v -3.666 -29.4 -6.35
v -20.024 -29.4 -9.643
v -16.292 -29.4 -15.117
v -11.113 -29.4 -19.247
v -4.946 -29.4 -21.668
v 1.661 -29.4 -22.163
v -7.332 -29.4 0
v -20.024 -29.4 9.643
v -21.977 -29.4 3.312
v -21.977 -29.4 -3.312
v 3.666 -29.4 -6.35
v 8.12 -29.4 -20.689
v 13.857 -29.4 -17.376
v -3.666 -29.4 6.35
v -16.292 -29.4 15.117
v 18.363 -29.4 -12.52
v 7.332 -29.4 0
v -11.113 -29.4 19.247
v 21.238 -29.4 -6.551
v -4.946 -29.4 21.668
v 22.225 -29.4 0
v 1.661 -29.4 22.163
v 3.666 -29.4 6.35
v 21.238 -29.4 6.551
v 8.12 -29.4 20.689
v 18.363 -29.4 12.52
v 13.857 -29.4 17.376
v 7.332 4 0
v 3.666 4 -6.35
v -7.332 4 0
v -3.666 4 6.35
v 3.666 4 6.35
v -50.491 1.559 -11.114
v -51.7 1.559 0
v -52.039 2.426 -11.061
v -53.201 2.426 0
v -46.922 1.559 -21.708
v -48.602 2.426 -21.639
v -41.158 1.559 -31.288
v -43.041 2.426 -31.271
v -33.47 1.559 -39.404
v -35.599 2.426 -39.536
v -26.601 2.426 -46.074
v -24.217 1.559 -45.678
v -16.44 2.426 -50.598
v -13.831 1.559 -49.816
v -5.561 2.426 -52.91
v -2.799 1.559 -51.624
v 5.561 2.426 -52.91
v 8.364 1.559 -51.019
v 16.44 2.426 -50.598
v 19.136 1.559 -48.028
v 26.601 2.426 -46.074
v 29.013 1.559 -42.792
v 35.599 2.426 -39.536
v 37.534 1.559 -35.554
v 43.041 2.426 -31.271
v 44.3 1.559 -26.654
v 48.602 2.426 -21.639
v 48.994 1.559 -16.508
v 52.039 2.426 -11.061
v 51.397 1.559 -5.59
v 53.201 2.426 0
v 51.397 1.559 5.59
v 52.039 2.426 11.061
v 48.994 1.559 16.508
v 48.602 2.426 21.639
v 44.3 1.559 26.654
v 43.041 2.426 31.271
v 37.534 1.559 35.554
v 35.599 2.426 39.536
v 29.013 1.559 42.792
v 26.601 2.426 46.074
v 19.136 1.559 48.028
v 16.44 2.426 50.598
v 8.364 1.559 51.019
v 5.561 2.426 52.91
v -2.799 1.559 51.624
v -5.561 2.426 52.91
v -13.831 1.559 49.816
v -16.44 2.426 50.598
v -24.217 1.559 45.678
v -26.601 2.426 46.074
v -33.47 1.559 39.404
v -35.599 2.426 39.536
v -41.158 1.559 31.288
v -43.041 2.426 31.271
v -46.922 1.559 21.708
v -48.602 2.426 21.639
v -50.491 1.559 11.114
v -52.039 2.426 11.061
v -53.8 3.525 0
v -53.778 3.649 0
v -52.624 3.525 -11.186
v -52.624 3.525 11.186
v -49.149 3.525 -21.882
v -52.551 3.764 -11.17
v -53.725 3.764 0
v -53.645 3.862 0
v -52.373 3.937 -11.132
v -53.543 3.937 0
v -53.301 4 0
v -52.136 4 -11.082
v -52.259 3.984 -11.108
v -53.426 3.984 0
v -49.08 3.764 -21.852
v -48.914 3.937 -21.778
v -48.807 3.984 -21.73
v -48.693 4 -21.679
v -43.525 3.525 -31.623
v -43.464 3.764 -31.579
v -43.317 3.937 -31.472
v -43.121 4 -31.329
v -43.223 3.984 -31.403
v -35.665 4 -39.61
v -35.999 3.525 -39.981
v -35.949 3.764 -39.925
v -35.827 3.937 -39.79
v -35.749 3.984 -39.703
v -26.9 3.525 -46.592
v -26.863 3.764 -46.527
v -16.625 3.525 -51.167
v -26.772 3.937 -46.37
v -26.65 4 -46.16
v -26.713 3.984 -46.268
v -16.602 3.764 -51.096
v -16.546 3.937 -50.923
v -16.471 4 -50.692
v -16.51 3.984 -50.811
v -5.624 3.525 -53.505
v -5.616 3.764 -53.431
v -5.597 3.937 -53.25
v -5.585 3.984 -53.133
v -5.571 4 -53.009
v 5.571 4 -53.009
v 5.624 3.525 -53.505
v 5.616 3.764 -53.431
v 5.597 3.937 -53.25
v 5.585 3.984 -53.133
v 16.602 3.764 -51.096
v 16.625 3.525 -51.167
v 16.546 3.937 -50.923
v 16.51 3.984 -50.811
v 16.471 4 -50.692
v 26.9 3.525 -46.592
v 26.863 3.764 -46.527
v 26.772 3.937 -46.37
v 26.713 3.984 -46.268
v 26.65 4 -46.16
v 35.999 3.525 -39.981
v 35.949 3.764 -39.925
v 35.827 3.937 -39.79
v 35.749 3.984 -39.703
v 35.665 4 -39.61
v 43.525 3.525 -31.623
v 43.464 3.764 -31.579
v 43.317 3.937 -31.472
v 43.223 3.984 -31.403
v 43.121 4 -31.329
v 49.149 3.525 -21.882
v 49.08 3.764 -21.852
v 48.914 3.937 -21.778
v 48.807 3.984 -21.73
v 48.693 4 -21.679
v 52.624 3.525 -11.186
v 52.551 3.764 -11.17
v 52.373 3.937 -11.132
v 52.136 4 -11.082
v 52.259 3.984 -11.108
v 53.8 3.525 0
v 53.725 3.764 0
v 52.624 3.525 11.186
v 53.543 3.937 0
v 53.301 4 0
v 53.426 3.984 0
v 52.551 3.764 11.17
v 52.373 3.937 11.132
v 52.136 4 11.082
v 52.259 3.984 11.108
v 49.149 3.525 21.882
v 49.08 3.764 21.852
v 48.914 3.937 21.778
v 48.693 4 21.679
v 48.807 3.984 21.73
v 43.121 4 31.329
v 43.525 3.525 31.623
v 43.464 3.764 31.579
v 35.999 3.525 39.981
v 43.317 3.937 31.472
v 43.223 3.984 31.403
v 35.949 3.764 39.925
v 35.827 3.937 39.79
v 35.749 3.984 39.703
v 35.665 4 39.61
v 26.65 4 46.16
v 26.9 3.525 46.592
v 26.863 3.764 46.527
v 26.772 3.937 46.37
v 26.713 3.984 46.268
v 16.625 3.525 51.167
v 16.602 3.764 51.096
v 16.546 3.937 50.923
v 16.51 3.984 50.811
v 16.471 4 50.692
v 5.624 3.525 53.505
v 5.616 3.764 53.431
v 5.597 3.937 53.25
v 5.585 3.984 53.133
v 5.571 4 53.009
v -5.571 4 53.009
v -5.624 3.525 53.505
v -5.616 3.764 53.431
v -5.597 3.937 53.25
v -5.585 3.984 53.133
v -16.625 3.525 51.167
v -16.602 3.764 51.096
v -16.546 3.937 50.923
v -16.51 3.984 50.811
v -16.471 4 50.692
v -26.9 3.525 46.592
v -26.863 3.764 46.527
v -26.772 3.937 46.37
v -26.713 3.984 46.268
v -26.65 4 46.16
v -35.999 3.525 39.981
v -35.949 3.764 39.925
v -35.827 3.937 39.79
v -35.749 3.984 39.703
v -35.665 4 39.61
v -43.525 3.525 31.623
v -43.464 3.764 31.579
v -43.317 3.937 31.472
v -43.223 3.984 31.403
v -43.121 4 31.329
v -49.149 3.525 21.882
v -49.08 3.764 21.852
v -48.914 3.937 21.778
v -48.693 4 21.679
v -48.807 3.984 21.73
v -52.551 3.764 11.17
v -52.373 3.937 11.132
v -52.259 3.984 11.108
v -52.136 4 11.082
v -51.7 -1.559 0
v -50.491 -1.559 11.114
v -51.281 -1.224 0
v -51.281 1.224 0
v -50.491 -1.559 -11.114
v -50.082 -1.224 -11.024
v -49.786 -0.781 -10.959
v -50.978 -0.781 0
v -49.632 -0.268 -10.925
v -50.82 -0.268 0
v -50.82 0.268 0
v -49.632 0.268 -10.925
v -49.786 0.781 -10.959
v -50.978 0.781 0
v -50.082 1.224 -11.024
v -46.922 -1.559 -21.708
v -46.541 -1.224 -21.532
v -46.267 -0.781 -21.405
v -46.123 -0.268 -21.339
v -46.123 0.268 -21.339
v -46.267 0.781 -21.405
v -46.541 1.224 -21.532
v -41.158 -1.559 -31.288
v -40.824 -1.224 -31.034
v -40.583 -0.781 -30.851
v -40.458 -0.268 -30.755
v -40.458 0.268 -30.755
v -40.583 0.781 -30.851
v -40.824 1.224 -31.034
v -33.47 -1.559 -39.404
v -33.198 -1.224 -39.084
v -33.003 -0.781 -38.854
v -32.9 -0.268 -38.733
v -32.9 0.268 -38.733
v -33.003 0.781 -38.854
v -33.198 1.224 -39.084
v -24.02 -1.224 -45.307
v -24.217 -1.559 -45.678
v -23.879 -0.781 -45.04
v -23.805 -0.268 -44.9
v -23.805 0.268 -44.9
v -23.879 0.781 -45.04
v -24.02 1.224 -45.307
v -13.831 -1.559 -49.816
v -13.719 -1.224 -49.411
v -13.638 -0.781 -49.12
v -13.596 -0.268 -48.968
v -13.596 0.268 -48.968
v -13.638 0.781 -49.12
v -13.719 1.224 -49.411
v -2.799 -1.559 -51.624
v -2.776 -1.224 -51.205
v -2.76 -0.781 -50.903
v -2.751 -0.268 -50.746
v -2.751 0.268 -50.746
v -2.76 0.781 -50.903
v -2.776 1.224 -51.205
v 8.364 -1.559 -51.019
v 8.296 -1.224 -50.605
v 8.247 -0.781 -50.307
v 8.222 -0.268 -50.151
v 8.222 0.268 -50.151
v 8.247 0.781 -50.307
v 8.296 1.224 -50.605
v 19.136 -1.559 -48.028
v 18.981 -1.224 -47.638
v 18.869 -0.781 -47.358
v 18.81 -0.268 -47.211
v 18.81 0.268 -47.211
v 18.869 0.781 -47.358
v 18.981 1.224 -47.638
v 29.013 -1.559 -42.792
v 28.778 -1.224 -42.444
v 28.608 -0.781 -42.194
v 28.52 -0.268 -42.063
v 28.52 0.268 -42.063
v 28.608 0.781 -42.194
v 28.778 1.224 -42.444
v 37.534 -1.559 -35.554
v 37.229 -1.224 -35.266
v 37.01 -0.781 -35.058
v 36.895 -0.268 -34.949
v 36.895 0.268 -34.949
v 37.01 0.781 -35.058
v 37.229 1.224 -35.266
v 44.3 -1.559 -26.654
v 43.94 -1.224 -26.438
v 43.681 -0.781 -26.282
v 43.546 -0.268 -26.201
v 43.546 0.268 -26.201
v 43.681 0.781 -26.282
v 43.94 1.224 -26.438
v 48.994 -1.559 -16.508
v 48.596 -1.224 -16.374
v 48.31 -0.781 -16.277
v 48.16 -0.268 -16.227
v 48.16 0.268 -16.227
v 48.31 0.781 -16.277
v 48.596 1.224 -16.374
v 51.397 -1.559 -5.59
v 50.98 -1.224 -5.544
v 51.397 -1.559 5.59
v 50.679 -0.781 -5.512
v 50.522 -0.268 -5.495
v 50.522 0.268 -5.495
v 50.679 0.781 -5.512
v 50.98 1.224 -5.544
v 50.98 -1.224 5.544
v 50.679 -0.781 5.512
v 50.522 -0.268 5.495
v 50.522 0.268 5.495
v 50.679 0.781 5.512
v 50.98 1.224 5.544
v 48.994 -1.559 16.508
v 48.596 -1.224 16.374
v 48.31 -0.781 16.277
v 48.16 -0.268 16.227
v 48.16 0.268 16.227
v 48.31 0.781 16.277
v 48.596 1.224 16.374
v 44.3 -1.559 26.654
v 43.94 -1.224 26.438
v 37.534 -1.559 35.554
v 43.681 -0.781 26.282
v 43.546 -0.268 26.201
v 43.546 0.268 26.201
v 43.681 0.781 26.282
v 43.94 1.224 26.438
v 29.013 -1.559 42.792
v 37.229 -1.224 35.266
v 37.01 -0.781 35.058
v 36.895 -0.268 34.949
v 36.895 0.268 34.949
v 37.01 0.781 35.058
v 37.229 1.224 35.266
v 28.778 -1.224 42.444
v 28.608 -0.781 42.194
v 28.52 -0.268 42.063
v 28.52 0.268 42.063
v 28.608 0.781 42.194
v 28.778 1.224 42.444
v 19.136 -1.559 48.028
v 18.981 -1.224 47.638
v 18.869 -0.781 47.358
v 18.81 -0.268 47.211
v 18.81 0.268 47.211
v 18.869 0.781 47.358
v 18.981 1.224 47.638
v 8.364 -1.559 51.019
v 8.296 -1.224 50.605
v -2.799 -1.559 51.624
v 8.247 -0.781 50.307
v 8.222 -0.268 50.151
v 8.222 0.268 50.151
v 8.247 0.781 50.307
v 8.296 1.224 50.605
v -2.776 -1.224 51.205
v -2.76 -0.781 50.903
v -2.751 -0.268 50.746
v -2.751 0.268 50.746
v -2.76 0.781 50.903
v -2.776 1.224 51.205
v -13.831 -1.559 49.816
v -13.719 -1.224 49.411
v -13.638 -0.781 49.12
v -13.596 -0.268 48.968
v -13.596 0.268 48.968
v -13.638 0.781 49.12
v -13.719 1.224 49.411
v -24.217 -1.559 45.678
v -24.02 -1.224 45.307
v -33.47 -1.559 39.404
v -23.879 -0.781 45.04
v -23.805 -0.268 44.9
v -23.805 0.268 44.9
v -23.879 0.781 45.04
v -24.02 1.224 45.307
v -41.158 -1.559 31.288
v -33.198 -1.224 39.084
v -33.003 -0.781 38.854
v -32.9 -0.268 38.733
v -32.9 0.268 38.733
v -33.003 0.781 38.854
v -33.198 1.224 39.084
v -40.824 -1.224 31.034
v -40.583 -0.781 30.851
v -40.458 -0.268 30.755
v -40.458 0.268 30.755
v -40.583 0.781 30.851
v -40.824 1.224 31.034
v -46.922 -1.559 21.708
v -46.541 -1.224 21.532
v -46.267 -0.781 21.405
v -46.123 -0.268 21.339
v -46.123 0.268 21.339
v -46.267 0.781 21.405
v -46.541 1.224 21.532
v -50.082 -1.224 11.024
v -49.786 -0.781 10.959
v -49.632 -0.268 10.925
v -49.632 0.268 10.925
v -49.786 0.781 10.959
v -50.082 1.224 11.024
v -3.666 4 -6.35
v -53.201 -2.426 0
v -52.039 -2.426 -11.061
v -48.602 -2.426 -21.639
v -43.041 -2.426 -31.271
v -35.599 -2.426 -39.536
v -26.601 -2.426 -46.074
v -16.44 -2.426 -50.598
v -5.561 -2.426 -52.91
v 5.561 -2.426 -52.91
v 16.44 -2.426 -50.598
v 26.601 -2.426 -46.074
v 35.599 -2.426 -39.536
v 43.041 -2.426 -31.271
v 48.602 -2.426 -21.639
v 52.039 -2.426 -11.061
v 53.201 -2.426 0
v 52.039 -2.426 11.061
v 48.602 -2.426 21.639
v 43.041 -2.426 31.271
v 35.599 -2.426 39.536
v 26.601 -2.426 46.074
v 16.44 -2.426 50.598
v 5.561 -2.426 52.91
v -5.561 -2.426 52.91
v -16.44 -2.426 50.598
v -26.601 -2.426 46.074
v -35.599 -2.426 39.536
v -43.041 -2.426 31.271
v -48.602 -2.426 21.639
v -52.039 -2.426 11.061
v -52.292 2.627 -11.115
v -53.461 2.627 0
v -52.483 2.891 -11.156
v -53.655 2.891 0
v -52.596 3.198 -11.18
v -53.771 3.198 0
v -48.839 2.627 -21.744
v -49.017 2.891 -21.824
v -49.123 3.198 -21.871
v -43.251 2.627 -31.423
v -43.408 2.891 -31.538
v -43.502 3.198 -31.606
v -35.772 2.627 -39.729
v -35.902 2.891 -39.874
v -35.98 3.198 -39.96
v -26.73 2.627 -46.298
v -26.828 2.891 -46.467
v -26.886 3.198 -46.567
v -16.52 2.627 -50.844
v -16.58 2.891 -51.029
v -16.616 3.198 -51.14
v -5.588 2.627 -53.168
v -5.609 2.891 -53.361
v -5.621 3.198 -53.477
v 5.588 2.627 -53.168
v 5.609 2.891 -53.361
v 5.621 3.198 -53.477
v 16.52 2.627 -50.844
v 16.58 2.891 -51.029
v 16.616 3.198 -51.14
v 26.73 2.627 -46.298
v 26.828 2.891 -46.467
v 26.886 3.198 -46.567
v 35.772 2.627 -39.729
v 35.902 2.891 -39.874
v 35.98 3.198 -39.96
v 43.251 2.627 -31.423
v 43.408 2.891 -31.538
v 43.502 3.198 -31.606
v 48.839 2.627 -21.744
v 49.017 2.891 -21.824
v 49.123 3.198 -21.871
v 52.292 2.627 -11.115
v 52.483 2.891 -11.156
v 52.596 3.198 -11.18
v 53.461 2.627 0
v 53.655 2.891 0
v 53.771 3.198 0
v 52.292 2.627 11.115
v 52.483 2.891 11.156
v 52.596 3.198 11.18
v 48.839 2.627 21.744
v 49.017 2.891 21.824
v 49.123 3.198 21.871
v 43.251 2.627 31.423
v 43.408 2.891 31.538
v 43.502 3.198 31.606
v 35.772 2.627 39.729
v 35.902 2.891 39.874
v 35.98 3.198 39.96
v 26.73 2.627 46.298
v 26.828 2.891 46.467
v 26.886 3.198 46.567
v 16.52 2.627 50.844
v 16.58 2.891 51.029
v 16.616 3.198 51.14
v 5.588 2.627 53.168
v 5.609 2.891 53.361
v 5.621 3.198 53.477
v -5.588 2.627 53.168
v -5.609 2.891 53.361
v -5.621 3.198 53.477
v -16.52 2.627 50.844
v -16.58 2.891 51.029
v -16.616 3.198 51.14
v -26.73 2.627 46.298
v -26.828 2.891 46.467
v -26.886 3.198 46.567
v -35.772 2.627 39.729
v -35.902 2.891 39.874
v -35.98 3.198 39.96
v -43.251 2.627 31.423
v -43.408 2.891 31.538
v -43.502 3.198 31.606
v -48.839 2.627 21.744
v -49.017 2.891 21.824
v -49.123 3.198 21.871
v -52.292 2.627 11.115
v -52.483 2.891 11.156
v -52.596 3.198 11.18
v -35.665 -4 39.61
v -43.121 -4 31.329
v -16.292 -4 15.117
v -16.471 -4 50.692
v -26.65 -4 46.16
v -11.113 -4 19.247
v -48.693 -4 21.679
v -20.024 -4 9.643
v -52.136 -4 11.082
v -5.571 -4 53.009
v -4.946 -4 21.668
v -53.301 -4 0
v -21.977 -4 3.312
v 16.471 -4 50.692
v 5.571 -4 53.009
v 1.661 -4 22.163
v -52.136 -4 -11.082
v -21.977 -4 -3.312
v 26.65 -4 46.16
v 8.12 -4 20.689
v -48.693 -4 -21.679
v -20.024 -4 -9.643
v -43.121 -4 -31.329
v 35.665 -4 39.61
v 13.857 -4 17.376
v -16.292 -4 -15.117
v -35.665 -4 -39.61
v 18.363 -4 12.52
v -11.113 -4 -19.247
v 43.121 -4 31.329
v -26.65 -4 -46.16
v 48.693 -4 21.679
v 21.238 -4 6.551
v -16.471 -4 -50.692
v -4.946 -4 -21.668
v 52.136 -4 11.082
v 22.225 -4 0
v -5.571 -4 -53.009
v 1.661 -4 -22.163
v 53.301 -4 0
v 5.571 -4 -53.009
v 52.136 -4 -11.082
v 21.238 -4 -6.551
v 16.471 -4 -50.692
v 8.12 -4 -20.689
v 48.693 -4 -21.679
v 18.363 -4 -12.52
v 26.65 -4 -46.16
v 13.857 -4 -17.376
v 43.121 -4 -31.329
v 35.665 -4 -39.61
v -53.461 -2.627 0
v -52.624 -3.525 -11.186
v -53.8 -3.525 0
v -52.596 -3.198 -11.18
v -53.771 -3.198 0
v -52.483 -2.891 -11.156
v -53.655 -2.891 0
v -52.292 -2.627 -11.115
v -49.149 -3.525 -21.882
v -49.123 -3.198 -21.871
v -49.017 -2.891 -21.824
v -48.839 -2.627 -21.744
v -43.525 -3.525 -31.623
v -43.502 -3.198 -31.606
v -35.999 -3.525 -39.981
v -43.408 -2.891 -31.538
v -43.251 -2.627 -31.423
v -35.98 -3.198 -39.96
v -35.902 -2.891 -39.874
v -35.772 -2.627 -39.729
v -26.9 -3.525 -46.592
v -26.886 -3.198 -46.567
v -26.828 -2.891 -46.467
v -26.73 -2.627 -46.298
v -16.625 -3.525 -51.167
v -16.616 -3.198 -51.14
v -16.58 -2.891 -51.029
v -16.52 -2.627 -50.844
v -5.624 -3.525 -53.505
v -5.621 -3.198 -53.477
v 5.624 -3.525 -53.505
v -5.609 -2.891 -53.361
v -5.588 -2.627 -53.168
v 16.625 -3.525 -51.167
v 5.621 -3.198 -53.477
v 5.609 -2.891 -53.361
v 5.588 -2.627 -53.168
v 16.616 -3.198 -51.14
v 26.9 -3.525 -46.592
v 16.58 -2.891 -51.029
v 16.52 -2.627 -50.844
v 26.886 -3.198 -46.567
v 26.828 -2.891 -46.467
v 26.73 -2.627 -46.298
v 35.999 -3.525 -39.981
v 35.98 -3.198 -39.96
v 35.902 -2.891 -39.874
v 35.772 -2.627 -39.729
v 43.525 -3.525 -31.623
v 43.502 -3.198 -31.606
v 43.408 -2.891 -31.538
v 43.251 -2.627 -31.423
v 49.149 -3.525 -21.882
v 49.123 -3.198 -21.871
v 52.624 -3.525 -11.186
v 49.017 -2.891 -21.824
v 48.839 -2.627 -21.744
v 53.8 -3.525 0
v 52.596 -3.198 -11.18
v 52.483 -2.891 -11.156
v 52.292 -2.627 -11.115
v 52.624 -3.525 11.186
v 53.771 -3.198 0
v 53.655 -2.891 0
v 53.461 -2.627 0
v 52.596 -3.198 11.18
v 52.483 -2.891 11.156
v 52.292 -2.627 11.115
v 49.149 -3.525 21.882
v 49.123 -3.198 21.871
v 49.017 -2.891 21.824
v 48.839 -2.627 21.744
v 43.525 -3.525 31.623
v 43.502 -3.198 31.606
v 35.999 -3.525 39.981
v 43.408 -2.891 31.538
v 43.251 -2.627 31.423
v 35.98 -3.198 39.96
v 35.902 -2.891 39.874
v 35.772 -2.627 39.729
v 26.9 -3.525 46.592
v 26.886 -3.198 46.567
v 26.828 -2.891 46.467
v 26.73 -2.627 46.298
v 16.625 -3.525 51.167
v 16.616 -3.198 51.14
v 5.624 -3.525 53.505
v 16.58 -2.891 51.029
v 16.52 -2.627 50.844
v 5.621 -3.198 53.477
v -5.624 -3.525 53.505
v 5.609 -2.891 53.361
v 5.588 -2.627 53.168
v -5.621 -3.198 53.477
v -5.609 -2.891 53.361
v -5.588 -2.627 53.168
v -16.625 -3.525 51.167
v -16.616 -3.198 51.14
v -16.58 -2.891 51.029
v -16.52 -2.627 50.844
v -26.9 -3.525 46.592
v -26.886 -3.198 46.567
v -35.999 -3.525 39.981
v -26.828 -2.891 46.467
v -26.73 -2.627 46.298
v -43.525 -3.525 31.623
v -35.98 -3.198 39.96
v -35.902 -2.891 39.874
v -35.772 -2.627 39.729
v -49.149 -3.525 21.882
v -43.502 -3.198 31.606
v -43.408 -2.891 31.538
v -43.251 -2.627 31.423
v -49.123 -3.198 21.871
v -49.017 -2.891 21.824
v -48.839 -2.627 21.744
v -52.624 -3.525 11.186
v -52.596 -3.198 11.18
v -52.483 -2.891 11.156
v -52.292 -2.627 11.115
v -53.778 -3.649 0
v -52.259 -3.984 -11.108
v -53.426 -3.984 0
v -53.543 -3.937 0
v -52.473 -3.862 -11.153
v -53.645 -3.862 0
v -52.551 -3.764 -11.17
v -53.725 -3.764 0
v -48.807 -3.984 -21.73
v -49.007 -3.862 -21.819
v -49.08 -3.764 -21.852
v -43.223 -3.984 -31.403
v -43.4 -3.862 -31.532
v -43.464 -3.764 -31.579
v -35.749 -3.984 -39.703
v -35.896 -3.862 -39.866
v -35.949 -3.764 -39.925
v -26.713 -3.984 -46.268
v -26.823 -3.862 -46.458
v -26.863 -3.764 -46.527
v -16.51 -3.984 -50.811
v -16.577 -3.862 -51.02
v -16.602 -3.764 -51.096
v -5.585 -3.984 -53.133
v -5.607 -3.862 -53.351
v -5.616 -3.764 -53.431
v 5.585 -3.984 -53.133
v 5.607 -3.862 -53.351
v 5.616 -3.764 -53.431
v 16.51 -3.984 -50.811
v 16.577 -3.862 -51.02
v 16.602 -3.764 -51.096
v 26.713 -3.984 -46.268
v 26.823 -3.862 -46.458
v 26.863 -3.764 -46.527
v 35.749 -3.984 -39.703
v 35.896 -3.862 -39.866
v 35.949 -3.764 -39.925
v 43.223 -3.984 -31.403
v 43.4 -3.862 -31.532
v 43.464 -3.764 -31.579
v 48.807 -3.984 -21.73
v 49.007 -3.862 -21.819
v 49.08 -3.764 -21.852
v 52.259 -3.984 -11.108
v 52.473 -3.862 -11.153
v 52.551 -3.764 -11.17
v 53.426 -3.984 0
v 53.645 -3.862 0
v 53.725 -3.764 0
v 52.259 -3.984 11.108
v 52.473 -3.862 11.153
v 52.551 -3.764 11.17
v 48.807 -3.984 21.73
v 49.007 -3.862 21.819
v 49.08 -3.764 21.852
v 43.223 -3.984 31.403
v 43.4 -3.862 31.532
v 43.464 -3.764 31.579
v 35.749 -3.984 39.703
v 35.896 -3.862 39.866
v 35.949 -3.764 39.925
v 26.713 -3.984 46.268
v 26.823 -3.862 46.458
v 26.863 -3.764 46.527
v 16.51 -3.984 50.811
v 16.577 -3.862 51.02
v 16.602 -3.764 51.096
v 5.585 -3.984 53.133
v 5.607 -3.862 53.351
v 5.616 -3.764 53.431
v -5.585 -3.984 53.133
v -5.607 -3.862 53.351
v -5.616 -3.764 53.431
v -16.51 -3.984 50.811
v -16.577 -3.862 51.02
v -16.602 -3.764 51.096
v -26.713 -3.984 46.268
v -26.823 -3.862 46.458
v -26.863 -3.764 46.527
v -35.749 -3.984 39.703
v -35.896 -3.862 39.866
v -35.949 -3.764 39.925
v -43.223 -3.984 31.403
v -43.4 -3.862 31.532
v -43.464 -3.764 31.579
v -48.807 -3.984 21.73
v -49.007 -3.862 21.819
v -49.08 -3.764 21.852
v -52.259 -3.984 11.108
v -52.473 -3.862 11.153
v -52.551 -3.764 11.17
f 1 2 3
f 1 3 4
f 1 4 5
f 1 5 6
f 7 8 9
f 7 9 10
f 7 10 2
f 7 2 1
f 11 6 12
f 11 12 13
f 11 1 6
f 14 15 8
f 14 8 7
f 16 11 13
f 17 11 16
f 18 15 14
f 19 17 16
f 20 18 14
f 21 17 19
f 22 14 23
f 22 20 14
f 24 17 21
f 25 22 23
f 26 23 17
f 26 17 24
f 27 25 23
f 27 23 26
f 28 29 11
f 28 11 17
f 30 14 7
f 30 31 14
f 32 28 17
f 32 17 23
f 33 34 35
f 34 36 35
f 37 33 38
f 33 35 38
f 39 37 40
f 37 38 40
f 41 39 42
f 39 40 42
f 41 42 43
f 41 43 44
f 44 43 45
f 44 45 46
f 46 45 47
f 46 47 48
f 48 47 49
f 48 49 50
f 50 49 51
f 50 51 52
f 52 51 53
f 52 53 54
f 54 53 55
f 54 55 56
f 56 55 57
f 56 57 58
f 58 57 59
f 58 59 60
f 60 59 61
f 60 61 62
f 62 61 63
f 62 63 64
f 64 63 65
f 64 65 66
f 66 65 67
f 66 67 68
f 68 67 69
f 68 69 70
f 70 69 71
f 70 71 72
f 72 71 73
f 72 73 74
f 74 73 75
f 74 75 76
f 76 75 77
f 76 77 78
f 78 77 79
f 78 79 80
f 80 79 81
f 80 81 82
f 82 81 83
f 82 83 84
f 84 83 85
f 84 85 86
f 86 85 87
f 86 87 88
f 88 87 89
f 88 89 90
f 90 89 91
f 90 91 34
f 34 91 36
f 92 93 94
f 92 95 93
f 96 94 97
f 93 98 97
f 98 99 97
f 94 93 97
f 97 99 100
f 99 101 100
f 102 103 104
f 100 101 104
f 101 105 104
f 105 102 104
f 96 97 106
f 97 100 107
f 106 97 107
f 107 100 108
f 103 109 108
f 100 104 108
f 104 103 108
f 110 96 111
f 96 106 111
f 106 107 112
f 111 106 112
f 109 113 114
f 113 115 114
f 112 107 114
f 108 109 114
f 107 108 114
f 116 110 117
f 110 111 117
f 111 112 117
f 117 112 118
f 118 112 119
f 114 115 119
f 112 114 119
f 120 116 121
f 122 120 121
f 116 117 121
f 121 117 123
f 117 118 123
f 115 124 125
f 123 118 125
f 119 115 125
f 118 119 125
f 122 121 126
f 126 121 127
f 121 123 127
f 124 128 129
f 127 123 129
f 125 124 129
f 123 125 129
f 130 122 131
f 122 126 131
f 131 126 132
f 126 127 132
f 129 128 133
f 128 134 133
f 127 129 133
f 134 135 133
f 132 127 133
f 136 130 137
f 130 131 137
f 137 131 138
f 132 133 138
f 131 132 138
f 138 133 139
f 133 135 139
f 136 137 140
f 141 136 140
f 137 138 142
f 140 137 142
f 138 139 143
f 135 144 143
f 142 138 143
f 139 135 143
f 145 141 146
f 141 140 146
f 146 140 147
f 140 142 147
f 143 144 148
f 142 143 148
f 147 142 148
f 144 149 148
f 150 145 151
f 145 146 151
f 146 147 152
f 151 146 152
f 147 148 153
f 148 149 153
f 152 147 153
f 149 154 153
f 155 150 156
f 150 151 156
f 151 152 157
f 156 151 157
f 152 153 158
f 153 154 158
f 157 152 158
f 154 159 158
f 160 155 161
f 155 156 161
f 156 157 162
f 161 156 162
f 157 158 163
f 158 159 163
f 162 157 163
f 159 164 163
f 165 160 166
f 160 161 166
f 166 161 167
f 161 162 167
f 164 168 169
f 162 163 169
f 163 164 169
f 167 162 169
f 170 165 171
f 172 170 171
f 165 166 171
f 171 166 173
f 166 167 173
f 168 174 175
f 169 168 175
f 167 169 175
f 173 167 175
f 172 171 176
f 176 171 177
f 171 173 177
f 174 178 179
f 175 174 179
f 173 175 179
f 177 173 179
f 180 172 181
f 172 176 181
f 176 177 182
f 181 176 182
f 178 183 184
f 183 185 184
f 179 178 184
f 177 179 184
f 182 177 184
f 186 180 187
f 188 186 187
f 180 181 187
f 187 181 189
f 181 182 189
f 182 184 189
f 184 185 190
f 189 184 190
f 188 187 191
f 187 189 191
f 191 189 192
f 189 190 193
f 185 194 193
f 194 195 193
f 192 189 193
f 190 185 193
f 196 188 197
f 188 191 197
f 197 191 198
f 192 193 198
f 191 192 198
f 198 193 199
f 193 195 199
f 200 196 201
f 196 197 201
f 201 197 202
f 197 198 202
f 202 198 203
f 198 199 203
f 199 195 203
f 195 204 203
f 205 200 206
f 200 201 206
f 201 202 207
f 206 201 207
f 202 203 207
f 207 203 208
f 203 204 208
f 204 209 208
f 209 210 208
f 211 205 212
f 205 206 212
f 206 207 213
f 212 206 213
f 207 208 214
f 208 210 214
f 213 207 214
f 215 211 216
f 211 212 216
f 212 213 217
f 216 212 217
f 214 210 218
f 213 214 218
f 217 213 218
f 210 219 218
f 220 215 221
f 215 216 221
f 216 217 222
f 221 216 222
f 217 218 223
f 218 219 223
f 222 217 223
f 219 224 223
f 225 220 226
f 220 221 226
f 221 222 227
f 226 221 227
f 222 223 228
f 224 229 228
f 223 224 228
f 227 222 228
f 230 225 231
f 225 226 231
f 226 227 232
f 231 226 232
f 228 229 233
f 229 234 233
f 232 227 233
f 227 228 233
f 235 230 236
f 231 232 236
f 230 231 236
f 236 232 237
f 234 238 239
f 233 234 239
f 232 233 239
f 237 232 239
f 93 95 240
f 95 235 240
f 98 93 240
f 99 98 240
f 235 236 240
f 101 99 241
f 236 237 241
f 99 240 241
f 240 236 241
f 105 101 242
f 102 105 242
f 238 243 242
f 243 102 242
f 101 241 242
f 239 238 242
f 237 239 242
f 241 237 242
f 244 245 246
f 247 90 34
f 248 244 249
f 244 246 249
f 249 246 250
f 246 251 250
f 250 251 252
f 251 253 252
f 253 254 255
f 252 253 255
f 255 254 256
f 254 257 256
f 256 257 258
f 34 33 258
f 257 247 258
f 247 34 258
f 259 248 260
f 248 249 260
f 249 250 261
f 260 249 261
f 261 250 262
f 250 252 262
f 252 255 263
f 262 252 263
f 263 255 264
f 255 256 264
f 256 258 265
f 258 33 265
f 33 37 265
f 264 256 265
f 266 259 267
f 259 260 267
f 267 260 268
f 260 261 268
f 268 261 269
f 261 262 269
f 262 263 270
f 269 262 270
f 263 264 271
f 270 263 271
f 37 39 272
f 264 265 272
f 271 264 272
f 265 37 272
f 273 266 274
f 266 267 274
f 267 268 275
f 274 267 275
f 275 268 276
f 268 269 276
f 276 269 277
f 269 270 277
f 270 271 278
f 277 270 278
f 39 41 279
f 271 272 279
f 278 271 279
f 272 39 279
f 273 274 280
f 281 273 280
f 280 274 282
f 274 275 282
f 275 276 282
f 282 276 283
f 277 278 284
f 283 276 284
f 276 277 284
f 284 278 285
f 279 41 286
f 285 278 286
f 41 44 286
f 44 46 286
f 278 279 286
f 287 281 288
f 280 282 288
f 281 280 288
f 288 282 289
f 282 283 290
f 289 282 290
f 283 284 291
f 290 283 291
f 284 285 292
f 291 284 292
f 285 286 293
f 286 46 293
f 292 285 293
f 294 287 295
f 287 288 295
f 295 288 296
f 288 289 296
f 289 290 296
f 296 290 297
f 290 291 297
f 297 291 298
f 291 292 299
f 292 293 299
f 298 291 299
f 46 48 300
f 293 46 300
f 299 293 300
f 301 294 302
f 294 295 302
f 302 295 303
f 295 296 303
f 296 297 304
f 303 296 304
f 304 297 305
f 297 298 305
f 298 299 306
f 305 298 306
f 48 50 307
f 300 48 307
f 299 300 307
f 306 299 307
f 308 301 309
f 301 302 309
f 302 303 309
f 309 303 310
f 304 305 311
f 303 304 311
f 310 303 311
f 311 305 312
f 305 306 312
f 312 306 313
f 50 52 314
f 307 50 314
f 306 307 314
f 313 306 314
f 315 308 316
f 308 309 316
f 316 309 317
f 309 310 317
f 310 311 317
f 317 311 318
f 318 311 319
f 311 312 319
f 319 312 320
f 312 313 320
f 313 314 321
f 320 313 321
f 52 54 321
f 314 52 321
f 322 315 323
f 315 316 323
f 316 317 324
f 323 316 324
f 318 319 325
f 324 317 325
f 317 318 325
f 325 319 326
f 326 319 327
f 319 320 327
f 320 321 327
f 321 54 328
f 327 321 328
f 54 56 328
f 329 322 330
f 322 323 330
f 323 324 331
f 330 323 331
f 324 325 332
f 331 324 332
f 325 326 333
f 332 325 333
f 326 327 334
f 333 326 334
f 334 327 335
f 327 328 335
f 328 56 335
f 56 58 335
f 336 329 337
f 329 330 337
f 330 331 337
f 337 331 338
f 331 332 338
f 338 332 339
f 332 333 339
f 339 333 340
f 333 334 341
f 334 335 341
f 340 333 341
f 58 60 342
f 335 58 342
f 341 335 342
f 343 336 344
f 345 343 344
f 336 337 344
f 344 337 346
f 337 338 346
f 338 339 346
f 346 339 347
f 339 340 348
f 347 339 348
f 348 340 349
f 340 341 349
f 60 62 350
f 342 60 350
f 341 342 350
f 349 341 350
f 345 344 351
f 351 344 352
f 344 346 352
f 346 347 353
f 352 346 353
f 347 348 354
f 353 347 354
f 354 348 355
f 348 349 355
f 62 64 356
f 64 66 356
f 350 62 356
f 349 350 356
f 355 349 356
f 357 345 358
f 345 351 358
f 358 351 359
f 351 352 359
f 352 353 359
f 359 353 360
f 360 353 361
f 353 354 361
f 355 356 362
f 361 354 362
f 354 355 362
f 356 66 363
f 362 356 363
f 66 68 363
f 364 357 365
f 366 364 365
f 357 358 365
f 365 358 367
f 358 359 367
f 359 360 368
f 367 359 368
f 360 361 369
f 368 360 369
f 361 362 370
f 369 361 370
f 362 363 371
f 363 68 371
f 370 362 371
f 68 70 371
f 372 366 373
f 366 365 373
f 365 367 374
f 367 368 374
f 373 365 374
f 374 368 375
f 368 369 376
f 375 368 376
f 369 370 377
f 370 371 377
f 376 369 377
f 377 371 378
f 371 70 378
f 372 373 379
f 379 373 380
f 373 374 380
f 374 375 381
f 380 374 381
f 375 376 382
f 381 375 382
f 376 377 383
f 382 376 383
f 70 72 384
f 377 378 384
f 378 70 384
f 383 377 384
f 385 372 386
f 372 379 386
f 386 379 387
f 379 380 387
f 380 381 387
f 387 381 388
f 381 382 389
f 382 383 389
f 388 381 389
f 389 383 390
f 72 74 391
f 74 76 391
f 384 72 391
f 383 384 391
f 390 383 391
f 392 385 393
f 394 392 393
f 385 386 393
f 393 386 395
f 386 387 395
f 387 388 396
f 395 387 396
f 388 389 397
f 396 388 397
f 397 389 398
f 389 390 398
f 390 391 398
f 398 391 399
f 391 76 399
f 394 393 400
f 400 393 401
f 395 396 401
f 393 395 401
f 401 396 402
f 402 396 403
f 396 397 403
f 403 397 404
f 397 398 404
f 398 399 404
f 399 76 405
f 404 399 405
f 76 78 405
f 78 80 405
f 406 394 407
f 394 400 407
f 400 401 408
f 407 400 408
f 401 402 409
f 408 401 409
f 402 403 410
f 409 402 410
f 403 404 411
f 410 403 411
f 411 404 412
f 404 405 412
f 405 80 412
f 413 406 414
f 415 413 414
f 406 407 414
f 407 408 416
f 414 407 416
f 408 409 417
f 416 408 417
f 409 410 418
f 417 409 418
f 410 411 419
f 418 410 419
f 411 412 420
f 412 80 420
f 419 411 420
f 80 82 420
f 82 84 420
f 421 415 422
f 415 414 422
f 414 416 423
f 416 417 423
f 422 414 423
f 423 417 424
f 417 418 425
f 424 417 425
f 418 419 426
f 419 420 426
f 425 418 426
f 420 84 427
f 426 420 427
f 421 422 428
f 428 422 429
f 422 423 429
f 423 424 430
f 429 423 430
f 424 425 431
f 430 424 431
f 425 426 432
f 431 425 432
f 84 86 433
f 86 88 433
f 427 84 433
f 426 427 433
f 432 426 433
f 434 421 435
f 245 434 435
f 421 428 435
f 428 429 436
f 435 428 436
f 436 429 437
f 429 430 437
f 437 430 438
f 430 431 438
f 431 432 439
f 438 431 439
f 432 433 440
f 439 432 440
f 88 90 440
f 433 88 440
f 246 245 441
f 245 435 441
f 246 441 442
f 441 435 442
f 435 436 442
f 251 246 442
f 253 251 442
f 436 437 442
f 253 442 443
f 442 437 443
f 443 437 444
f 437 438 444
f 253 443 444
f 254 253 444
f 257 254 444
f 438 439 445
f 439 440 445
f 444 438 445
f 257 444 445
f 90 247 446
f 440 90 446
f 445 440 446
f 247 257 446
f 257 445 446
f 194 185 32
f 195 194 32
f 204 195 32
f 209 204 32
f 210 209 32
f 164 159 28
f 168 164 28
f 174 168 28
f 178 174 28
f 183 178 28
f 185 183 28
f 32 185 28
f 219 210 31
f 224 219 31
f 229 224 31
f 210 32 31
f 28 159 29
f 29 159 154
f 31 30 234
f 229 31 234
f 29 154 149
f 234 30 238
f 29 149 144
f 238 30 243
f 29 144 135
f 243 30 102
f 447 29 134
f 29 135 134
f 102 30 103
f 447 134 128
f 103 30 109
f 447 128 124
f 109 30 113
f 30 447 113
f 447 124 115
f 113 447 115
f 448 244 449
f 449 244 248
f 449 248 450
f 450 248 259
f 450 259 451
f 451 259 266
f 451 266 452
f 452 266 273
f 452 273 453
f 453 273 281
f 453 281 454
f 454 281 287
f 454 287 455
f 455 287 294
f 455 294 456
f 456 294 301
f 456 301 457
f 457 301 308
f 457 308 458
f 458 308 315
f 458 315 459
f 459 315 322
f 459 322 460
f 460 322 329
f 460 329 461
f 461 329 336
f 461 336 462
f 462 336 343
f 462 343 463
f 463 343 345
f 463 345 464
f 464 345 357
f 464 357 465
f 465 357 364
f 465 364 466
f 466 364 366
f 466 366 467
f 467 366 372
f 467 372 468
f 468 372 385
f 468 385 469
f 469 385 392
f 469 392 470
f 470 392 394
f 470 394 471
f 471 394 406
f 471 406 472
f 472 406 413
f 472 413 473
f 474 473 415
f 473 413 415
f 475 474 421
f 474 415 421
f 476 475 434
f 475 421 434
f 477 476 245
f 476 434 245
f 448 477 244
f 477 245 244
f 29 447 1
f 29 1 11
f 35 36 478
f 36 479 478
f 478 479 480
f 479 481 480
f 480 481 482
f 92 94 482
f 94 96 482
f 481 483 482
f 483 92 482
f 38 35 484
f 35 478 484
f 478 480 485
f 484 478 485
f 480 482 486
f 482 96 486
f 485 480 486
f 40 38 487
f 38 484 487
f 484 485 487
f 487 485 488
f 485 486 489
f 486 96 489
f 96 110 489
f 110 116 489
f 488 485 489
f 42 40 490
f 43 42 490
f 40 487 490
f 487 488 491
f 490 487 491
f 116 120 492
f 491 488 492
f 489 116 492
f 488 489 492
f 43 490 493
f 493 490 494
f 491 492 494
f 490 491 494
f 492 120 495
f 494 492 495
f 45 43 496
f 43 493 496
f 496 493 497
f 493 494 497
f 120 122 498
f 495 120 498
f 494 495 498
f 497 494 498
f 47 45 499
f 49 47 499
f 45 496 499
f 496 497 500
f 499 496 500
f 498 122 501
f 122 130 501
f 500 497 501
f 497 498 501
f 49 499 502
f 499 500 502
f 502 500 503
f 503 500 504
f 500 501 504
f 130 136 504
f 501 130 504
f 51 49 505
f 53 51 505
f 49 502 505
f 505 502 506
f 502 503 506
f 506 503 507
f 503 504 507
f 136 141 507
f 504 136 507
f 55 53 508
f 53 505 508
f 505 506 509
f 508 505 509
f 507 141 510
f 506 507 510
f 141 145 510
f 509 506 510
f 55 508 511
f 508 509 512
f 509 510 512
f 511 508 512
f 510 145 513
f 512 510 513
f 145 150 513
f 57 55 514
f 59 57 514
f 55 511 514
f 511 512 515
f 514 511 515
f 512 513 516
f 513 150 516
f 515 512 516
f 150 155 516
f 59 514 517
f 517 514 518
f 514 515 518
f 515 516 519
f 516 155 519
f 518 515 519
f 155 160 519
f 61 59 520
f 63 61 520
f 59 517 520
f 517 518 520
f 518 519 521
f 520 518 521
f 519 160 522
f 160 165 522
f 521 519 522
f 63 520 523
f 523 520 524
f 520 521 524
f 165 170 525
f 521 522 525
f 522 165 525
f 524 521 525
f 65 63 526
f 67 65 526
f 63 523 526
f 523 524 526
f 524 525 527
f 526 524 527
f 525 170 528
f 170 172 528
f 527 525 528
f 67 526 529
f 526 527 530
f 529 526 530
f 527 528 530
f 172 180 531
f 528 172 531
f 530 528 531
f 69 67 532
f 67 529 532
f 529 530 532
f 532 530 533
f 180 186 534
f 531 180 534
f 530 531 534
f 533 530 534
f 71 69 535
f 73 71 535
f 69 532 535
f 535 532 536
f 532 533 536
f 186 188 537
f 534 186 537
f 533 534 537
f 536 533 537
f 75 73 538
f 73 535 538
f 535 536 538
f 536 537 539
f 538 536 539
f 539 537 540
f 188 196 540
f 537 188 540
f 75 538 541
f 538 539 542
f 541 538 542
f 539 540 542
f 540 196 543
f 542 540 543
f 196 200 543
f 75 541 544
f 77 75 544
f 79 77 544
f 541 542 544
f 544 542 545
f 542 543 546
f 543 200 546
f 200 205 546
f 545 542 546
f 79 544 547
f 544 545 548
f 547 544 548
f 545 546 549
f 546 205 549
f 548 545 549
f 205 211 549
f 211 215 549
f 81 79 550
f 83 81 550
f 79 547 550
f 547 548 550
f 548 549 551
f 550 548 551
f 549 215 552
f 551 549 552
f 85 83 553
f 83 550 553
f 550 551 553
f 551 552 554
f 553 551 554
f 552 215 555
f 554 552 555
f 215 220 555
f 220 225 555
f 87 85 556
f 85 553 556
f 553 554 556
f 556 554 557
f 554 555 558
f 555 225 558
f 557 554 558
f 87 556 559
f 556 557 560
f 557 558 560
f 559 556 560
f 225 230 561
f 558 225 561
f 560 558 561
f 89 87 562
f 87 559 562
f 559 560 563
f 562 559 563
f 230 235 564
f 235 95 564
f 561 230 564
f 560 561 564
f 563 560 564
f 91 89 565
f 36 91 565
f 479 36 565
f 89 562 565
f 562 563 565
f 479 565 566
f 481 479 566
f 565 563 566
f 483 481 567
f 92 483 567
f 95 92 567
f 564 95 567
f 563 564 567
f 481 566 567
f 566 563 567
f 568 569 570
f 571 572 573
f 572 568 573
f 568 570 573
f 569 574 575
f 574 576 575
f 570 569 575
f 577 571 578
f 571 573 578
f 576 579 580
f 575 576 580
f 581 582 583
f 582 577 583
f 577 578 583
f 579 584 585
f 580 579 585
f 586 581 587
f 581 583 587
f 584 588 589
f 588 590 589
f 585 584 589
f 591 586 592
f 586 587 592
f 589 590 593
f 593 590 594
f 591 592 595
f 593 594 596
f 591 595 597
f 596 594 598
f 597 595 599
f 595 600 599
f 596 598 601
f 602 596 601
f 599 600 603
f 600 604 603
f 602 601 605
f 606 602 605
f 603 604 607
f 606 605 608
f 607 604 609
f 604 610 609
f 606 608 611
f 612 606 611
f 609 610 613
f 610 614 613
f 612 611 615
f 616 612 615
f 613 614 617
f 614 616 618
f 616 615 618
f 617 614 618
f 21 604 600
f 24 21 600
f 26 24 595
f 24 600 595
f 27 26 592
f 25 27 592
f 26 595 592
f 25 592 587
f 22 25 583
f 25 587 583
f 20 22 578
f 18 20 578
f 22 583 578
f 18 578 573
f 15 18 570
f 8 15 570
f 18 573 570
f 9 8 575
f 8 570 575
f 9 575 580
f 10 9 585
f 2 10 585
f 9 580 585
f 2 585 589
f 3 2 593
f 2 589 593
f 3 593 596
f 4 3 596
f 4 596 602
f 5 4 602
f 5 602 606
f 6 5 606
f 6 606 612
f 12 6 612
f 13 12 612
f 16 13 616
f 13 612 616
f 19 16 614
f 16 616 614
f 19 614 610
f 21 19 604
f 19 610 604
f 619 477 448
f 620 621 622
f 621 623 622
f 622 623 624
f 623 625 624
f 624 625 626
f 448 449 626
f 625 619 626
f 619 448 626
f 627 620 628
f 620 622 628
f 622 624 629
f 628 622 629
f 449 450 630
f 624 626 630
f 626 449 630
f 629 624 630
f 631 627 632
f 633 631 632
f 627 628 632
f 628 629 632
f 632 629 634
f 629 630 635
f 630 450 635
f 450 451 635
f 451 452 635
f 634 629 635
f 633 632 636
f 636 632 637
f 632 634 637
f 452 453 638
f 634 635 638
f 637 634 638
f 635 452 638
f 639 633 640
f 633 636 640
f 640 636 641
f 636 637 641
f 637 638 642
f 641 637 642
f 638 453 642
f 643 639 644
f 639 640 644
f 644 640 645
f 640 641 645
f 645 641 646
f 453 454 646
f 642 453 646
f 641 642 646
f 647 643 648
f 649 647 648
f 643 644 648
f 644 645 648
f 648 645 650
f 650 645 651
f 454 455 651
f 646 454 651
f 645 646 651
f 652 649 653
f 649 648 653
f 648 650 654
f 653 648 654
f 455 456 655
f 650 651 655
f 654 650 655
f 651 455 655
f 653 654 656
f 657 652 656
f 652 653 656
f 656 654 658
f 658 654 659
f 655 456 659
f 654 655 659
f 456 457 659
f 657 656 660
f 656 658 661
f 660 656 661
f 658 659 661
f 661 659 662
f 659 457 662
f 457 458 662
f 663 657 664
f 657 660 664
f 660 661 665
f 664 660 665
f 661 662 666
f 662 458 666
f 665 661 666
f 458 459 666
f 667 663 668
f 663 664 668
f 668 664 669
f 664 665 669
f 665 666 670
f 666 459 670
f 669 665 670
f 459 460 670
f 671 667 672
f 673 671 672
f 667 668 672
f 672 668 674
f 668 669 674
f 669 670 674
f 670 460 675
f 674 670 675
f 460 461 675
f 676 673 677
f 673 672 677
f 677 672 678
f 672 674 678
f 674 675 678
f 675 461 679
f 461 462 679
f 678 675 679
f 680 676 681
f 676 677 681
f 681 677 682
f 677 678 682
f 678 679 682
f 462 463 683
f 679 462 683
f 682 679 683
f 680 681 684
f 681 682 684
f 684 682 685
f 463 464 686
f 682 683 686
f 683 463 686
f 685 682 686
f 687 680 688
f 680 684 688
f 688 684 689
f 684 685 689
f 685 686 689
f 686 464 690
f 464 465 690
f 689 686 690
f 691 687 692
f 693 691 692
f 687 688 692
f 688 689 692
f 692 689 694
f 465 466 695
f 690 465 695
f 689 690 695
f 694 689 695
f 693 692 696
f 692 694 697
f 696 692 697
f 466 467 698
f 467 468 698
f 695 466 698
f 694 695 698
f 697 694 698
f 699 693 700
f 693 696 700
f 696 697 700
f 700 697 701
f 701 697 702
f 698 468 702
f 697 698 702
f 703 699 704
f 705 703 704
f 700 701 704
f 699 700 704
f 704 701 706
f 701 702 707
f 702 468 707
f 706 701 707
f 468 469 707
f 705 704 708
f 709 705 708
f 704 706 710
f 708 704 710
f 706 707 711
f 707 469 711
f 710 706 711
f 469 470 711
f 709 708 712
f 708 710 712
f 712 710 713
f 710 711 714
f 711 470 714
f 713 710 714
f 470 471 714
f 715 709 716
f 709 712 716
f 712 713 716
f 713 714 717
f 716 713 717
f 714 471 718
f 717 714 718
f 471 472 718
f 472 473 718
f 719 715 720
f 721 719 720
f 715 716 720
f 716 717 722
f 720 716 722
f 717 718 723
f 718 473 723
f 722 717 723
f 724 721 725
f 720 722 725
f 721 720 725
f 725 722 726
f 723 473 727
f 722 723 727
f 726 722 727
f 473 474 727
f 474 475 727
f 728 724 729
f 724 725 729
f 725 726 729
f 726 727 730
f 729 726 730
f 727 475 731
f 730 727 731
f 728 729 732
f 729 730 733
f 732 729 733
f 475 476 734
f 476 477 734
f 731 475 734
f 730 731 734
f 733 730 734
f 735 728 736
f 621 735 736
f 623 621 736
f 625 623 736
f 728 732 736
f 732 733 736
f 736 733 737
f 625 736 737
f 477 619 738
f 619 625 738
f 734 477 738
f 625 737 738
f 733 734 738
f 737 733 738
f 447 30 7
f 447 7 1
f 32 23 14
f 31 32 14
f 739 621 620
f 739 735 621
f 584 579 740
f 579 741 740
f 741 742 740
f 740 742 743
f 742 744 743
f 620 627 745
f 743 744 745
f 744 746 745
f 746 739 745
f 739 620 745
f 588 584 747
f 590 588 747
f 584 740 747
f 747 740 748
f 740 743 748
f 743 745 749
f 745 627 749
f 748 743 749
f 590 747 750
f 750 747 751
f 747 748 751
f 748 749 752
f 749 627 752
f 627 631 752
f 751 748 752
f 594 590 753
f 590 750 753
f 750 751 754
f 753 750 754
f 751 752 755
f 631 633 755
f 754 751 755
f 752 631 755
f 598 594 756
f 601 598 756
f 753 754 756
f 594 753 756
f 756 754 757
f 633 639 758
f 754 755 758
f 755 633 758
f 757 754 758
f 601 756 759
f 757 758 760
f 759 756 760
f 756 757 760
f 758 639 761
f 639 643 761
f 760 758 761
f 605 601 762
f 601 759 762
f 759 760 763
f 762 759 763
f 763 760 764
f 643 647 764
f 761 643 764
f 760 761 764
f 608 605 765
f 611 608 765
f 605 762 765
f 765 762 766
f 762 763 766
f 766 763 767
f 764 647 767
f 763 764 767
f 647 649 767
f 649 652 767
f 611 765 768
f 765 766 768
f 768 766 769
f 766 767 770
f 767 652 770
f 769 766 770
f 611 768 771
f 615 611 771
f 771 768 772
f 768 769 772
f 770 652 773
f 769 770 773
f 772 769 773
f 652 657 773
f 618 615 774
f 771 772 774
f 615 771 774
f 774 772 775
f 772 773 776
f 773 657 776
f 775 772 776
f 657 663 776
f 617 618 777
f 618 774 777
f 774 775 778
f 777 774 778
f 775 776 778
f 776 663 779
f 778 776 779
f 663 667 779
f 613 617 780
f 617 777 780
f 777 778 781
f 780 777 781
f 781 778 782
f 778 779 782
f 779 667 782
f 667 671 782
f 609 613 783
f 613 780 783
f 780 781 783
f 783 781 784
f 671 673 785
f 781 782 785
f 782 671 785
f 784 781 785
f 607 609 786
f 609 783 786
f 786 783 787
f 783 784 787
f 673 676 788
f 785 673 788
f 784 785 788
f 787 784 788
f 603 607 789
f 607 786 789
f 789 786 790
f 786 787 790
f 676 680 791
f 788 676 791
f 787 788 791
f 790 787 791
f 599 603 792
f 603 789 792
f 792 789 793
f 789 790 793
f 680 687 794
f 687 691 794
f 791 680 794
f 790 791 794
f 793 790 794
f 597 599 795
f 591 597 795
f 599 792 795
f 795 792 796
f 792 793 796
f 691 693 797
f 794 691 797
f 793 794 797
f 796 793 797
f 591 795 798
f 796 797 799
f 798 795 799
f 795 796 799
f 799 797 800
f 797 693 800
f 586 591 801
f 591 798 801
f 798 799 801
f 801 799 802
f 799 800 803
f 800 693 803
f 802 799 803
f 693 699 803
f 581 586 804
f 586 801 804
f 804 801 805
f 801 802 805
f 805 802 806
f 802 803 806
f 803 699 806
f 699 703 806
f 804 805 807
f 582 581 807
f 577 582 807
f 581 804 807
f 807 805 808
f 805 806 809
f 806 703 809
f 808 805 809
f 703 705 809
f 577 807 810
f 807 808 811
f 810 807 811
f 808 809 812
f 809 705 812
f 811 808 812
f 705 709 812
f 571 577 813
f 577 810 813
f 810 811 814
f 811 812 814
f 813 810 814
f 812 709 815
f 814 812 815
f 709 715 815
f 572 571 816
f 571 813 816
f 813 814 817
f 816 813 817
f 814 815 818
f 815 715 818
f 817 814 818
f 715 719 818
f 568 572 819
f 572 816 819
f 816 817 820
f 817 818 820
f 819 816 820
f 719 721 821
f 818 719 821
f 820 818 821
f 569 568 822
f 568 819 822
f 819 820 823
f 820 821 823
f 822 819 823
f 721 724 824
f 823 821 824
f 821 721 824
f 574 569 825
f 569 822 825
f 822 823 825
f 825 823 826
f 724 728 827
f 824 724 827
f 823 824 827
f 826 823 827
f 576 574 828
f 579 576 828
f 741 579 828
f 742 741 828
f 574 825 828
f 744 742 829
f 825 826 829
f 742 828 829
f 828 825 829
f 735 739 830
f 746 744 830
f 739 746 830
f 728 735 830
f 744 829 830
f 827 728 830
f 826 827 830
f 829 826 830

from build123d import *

# Parameters (mm, degrees)
CUT_EXTRUDE2_DEPTH  = 9.0000094
SKETCH3_R           = 22.225
BOSS_EXTRUDE1_DEPTH = 25.4


with BuildPart() as part:
    # Sketch1 → Revolve1 (revolve)
    with BuildSketch(Plane(origin=(0, 0, 0), x_dir=(0, 1, 0), z_dir=(0, 0, 1))):
        with BuildLine():
            Line((4.0000047, 0), (-4.0000047, 0))
            Line((-4.0000047, 0), (-4.0000047, 53.300621907))
            ThreePointArc((-4.0000047, 53.300621907), (-3.862299847, 53.645211447), (-3.525035946, 53.799994))
            ThreePointArc((-3.525035946, 53.799994), (-2.891173009, 53.65542644), (-2.425734949, 53.201499778))
            Line((-2.425734949, 53.201499778), (-1.558842609, 51.6999982))
            ThreePointArc((-1.558842609, 51.6999982), (0, 50.8), (1.558842609, 51.6999982))
            Line((1.558842609, 51.6999982), (2.425734949, 53.201499778))
            ThreePointArc((2.425734949, 53.201499778), (2.891173009, 53.65542644), (3.525035946, 53.799994))
            ThreePointArc((3.525035946, 53.799994), (3.862299847, 53.645211447), (4.0000047, 53.300621907))
            Line((4.0000047, 53.300621907), (4.0000047, 0))
        make_face()
    revolve(axis=Axis((0, 4.0000047, 0), (0, -1, 0)))

    # Sketch2 → Cut-Extrude2 (cut, through all)
    with BuildSketch(Plane.XZ.offset(4.0000047)):
        Polygon((7.332348419, 0), (3.666174209, 6.35), (-3.666174209, 6.35), (-7.332348419, 0), (-3.666174209, -6.35), (3.666174209, -6.35), align=None)
    extrude(amount=-CUT_EXTRUDE2_DEPTH, mode=Mode.SUBTRACT)

    # Sketch3 → Boss-Extrude1 (add)
    with BuildSketch(Plane.XZ.offset(4.0000047)):
        Circle(SKETCH3_R)
        Polygon((-3.666174209, 6.35), (-7.332348419, 0), (-3.666174209, -6.35), (3.666174209, -6.35), (7.332348419, 0), (3.666174209, 6.35), align=None, mode=Mode.SUBTRACT)
    extrude(amount=BOSS_EXTRUDE1_DEPTH)


solid = part.part
